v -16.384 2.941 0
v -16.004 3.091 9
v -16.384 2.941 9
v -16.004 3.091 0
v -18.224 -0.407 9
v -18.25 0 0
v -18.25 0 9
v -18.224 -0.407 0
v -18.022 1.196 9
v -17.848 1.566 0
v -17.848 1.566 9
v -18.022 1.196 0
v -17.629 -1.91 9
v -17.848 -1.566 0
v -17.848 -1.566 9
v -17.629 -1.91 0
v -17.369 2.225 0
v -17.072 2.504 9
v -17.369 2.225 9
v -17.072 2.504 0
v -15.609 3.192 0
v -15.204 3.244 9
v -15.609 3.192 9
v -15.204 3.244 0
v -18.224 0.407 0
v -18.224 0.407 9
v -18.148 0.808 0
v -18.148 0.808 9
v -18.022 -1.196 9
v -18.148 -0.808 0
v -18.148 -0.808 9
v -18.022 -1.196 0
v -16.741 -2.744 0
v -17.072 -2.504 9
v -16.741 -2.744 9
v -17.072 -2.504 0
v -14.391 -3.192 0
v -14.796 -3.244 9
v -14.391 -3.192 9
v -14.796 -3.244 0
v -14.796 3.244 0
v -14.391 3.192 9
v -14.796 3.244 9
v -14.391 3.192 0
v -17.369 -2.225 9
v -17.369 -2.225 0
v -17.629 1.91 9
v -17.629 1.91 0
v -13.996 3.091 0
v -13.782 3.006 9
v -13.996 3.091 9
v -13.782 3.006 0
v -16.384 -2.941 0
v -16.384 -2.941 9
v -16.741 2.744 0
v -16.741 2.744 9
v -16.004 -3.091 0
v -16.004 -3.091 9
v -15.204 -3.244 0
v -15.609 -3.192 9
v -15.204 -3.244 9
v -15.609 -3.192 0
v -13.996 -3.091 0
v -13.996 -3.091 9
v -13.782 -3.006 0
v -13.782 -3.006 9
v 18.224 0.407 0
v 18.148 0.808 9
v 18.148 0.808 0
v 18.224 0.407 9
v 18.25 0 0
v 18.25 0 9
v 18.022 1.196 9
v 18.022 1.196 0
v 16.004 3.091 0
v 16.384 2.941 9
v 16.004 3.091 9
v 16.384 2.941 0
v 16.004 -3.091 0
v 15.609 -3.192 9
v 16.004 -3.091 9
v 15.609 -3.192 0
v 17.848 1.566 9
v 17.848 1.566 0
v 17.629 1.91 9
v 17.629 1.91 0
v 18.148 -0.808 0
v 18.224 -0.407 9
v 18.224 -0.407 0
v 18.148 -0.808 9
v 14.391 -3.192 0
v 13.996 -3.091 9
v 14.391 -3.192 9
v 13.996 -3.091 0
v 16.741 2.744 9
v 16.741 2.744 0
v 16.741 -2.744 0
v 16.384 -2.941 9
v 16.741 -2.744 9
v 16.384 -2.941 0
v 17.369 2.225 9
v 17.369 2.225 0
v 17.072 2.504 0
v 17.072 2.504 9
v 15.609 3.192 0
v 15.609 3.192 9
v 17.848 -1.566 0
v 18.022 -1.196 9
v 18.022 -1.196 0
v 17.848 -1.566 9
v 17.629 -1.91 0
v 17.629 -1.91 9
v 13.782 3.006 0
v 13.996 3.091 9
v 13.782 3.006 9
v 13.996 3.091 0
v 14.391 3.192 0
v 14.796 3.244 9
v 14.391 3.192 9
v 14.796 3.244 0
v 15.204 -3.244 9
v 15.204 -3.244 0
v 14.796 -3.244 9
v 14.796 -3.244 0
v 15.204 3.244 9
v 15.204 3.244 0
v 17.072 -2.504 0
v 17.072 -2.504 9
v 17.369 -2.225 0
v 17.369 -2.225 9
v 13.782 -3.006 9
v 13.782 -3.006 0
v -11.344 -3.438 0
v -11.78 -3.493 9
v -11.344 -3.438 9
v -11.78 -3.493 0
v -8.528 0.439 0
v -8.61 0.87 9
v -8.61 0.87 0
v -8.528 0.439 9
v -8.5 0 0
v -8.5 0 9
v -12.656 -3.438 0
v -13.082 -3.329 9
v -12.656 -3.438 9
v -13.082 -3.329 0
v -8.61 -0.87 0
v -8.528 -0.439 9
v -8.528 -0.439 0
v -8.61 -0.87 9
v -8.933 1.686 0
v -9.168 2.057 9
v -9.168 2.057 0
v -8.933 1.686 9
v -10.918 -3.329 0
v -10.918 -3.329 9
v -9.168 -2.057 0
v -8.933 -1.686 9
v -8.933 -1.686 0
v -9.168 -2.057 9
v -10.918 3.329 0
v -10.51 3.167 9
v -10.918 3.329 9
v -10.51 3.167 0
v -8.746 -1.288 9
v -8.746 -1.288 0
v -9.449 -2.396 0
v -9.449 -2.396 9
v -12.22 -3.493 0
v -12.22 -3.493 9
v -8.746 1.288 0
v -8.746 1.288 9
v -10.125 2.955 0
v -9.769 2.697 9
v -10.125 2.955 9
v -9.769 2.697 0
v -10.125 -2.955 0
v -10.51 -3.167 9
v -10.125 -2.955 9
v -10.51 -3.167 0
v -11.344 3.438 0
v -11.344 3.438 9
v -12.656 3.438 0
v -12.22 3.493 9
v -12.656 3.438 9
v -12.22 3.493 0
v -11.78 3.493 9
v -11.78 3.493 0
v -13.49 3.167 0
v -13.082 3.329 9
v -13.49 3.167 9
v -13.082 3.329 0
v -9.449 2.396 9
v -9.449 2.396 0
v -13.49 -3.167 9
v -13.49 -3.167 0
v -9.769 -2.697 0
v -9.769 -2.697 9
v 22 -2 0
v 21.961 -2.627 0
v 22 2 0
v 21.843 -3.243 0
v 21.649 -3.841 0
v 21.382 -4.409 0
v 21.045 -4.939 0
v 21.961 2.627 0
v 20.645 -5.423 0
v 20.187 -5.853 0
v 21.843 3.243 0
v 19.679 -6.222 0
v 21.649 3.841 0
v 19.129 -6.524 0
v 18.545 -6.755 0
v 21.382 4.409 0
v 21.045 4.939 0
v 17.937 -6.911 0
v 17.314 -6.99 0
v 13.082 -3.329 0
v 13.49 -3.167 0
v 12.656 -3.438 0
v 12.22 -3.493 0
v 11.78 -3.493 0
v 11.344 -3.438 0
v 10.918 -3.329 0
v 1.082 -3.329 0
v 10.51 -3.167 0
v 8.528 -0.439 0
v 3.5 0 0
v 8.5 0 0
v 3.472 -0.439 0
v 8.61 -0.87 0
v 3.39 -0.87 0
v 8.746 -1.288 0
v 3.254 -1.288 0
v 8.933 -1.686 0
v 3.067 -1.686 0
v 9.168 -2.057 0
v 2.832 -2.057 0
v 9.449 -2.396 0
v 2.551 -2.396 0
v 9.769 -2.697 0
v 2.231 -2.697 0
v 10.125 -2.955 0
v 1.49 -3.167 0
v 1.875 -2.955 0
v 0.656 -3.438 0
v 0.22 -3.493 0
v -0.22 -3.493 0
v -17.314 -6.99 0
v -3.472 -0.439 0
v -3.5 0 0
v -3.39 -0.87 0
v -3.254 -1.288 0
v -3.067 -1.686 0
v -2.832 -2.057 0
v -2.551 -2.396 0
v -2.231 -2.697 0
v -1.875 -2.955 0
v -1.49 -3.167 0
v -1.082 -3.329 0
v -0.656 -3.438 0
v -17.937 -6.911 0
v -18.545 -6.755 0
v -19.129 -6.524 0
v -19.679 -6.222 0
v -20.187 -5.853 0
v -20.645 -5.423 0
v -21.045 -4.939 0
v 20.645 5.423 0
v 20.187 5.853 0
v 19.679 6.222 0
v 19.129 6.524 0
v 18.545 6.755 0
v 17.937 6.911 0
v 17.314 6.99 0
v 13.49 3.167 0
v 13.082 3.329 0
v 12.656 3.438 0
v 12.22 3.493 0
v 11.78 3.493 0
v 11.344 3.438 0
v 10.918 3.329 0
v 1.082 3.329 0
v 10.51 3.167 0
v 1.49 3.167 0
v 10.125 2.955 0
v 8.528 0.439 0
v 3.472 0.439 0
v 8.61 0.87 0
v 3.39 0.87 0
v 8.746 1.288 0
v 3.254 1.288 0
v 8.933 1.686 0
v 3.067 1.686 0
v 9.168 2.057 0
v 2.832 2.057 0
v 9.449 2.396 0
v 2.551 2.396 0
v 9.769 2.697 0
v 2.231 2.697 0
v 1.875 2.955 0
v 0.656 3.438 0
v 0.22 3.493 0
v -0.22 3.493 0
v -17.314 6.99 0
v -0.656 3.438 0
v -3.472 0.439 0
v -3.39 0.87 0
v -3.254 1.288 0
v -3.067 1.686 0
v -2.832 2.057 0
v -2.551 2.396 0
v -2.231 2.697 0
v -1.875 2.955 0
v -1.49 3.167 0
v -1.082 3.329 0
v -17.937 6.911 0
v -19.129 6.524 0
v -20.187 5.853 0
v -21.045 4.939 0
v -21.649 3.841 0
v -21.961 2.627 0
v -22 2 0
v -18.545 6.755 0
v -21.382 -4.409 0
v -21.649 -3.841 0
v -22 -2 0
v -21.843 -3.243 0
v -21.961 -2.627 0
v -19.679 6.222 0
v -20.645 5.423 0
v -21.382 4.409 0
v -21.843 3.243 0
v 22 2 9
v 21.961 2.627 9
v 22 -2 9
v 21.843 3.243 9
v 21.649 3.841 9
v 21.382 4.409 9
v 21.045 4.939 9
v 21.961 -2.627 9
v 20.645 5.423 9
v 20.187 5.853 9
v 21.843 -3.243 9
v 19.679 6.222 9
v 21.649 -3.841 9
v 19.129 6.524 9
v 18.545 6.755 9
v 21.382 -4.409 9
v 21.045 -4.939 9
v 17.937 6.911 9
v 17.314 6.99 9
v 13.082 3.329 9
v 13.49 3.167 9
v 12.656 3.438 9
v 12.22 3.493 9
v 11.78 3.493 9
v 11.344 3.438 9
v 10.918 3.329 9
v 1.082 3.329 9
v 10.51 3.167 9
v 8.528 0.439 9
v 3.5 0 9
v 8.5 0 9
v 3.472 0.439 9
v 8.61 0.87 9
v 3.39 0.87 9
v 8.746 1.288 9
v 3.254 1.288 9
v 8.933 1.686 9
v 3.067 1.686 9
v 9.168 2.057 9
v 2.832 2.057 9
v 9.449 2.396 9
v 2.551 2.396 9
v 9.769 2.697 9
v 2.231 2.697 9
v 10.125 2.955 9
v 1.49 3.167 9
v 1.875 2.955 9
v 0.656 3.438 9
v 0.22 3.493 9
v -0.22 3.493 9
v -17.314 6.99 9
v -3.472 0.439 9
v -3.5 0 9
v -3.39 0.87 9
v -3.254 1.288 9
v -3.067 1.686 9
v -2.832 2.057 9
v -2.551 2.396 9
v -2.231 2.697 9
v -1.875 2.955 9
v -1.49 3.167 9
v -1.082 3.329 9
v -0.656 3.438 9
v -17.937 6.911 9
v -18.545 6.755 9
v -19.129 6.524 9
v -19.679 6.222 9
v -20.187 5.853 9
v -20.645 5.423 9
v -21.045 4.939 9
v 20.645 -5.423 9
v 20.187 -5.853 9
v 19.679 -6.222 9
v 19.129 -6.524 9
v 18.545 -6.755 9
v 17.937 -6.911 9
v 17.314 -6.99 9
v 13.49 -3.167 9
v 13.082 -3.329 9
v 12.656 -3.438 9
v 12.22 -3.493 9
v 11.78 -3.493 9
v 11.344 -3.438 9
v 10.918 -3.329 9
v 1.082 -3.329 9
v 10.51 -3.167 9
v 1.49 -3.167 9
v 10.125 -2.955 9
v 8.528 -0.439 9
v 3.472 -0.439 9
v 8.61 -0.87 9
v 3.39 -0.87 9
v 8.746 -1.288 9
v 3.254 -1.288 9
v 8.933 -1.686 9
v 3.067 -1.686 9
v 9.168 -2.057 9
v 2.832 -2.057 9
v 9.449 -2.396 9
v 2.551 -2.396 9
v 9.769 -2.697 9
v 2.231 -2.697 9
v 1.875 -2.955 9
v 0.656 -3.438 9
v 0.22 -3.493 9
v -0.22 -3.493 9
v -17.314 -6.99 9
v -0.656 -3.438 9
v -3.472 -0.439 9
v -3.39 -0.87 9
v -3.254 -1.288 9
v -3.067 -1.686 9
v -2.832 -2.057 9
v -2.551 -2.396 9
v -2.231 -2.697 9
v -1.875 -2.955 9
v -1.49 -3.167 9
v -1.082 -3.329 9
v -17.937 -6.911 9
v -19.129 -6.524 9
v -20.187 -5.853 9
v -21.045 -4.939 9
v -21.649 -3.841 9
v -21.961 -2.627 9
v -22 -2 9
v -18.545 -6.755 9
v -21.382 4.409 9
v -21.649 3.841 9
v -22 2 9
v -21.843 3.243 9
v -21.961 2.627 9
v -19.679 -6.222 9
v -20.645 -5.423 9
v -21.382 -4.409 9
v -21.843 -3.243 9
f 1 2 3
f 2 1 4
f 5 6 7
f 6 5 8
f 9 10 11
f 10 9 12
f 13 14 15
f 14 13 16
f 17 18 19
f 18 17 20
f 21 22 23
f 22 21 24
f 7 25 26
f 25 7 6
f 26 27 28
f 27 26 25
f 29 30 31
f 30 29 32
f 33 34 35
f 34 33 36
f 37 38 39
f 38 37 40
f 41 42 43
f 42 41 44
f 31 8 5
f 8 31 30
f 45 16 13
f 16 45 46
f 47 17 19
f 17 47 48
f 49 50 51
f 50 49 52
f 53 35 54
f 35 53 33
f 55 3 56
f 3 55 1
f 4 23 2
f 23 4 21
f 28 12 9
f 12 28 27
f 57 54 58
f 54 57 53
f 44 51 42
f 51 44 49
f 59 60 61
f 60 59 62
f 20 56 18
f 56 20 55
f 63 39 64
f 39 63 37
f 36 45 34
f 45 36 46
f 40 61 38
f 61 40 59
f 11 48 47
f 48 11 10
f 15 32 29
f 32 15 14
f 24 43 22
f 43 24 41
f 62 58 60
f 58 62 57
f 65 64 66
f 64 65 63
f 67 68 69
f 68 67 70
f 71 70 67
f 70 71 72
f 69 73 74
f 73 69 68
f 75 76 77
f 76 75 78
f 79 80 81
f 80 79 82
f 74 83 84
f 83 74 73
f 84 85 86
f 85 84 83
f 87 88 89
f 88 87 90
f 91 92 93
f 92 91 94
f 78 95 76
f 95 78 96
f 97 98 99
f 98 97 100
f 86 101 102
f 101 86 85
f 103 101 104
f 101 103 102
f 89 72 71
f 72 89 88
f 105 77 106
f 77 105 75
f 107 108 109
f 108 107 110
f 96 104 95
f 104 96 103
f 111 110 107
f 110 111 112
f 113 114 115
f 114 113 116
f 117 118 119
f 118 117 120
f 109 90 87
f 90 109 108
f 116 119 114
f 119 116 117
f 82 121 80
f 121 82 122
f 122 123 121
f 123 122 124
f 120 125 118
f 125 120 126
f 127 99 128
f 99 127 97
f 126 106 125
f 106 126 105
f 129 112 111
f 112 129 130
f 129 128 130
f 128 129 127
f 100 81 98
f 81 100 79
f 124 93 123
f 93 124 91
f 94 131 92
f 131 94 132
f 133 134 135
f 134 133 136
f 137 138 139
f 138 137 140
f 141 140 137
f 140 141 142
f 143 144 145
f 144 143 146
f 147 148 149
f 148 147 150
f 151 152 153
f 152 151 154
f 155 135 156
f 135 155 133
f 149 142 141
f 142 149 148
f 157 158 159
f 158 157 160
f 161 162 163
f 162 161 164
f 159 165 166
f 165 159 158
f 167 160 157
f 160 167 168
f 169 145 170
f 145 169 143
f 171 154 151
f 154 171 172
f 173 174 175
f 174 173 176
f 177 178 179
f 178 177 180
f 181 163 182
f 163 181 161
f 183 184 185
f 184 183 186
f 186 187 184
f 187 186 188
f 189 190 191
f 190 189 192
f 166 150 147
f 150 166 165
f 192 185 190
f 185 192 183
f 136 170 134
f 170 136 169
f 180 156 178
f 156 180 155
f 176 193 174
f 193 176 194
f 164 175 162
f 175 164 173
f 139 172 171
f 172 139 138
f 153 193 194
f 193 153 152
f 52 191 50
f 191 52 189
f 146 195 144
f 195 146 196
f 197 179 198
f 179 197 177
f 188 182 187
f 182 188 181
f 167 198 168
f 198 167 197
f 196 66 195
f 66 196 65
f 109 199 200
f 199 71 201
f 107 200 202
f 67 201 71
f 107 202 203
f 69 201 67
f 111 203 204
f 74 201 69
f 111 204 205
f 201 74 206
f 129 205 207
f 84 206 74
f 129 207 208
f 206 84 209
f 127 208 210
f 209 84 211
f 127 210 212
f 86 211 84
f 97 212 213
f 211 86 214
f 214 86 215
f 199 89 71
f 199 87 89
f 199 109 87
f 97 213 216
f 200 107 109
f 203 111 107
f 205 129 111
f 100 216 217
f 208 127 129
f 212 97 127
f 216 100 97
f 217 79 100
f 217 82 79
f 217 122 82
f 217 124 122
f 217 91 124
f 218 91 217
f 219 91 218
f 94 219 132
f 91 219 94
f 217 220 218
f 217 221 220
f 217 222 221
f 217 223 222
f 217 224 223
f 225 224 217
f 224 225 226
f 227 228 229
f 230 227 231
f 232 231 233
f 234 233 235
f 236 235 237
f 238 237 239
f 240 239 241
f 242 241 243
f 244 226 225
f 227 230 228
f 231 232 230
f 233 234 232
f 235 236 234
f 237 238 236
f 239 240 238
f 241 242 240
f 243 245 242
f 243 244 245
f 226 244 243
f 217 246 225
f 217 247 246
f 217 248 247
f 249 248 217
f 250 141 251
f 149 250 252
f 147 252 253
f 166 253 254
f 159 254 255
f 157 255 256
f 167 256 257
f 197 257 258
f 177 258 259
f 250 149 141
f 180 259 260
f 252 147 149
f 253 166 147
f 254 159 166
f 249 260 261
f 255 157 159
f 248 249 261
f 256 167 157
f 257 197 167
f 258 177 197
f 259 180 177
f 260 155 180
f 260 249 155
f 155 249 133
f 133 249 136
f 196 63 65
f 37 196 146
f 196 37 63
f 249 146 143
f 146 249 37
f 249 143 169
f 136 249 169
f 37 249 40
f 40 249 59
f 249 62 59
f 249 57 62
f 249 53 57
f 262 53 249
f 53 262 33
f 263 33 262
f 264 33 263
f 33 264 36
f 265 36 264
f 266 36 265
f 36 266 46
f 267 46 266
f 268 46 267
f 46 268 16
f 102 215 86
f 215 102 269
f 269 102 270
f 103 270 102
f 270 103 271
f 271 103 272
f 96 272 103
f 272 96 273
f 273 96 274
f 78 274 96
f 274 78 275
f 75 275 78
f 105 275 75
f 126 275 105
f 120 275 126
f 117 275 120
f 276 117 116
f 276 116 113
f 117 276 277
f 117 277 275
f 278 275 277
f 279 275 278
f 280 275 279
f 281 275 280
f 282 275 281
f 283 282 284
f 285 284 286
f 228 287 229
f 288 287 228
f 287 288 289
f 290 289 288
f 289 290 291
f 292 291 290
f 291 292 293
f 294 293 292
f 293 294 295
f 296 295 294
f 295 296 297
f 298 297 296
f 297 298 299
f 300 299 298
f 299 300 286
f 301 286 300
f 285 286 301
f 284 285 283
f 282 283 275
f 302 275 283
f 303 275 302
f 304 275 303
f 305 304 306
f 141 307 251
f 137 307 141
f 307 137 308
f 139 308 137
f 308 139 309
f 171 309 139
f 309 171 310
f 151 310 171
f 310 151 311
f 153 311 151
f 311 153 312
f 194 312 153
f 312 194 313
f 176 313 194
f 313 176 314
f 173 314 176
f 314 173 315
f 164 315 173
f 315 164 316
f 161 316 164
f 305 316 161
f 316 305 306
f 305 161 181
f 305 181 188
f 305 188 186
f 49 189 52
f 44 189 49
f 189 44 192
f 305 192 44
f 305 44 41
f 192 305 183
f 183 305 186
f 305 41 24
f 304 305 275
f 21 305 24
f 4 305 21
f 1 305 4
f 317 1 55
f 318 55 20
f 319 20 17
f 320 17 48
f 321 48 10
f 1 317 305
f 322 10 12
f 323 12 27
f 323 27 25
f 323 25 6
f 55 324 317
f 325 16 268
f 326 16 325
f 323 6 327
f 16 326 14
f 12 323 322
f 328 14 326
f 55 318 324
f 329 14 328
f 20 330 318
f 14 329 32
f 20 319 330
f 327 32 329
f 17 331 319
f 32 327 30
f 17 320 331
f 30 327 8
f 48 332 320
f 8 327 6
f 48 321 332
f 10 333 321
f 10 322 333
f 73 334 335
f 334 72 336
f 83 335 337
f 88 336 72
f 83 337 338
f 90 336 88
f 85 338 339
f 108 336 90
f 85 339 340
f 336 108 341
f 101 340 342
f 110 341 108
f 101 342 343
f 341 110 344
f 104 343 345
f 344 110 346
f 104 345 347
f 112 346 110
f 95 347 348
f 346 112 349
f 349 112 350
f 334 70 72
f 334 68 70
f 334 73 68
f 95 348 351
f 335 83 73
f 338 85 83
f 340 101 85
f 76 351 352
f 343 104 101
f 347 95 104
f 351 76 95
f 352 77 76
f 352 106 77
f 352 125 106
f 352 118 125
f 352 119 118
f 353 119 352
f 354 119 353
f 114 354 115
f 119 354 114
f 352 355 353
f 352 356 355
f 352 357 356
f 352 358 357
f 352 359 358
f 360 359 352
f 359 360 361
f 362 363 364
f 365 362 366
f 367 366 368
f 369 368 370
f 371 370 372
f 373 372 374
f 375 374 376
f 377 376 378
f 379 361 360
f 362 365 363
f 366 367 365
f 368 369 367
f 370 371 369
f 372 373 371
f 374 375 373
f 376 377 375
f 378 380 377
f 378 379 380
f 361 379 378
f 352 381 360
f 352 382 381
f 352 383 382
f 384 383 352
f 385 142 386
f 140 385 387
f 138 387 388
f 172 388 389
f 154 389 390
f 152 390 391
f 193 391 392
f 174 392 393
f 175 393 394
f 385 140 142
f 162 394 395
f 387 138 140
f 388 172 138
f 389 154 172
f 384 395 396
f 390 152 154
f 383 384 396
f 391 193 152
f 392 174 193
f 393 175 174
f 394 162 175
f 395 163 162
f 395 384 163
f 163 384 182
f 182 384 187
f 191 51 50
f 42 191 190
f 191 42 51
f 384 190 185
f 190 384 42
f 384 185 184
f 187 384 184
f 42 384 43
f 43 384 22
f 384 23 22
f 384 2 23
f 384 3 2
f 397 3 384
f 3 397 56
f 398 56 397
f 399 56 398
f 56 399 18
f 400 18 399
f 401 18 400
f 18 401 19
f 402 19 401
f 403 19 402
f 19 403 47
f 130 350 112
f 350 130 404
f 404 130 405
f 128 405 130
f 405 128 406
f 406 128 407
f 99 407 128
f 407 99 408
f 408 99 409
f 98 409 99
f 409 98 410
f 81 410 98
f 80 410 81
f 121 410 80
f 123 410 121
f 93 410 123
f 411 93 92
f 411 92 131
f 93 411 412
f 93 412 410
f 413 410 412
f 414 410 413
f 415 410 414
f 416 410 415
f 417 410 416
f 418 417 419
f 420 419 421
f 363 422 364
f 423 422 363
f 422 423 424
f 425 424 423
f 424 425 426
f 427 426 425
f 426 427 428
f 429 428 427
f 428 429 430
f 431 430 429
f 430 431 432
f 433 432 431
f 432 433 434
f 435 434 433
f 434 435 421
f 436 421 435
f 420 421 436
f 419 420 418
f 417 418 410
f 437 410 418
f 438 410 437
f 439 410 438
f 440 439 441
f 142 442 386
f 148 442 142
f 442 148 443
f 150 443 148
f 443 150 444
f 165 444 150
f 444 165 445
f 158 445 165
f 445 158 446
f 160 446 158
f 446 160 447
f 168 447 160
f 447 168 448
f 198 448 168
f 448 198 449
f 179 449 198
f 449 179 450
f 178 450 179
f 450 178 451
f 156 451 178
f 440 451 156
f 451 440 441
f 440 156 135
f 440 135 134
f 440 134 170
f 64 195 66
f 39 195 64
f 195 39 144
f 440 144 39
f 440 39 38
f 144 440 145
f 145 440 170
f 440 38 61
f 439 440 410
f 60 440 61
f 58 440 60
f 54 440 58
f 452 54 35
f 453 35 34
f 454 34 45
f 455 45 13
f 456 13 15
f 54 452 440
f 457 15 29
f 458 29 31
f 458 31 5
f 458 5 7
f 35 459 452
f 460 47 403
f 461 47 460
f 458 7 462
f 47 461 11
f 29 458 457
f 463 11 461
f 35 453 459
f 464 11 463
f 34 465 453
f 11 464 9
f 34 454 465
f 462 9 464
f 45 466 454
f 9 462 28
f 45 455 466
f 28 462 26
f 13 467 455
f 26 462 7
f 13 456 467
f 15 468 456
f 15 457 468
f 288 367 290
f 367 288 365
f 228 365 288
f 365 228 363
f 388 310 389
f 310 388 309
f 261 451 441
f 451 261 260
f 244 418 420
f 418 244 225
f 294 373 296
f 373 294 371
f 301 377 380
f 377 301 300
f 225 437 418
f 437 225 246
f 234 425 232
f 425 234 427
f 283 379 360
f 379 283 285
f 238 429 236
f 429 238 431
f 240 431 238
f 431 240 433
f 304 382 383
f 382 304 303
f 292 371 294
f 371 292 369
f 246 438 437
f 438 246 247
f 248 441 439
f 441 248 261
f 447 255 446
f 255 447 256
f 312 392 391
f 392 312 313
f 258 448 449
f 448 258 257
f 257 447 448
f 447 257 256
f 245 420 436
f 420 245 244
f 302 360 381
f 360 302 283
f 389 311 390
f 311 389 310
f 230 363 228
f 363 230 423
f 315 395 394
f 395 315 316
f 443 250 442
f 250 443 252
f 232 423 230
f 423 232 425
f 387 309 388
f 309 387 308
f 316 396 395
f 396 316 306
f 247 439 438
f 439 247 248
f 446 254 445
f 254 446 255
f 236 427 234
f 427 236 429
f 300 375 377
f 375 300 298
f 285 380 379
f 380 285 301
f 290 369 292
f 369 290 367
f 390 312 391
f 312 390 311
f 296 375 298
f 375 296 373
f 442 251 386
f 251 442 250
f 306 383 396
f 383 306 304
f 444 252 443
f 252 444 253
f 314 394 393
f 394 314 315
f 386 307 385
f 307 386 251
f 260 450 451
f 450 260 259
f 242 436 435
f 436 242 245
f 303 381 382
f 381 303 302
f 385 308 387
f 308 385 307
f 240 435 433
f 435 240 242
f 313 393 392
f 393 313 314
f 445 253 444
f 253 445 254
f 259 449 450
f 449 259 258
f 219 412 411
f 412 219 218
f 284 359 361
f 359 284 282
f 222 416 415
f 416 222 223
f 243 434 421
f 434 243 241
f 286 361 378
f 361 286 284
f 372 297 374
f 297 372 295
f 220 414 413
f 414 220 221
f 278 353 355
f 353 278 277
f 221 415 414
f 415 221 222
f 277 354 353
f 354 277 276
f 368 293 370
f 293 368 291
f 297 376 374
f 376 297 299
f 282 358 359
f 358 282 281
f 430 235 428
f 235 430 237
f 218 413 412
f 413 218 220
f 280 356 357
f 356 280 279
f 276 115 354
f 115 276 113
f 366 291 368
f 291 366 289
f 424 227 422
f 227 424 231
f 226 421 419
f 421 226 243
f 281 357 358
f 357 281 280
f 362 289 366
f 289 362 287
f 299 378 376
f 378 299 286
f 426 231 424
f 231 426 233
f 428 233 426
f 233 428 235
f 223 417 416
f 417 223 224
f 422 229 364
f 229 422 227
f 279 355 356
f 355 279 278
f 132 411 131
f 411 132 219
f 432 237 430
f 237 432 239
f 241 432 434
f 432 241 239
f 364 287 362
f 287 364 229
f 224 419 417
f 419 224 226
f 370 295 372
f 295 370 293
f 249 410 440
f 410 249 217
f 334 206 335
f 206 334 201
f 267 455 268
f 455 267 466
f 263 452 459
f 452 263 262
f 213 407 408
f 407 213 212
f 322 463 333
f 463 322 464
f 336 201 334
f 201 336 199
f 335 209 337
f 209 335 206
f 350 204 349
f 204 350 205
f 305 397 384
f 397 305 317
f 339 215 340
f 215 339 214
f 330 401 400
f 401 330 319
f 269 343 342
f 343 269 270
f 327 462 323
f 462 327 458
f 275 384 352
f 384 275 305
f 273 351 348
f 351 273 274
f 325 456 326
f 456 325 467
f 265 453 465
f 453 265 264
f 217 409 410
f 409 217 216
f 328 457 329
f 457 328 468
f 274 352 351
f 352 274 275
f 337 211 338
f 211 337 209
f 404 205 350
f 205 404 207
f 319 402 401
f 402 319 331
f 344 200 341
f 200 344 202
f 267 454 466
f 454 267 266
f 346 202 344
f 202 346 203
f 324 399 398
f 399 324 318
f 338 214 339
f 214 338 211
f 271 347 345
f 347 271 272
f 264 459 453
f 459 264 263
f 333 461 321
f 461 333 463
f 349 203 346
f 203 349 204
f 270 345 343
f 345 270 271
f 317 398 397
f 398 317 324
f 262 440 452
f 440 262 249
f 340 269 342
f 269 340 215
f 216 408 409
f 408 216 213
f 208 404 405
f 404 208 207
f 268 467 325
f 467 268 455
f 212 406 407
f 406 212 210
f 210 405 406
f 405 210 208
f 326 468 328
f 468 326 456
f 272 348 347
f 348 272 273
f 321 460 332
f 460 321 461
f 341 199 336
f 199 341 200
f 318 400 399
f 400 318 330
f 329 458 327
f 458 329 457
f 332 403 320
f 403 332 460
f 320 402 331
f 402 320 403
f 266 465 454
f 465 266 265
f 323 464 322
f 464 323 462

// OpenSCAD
$fn = 50;

difference() {
	union() {
		hull() {
			translate(v = [-17.0, 2.0, 0]) {
				cylinder(h = 9, r = 5);
			}
			translate(v = [17.0, 2.0, 0]) {
				cylinder(h = 9, r = 5);
			}
			translate(v = [-17.0, -2.0, 0]) {
				cylinder(h = 9, r = 5);
			}
			translate(v = [17.0, -2.0, 0]) {
				cylinder(h = 9, r = 5);
			}
		}
	}
	union() {
		translate(v = [-15.0, 0.0, -100.0]) {
			cylinder(h = 200, r = 3.25);
		}
		translate(v = [15.0, 0.0, -100.0]) {
			cylinder(h = 200, r = 3.25);
		}
		translate(v = [-15.0, 0.0, -100.0]) {
			cylinder(h = 200, r = 1.8);
		}
		translate(v = [15.0, 0.0, -100.0]) {
			cylinder(h = 200, r = 1.8);
		}
		translate(v = [-12.0, 0, 0.0]) {
			cylinder(h = 9, r = 3.5);
		}
		cylinder(h = 9, r = 3.5);
		translate(v = [12.0, 0, 0.0]) {
			cylinder(h = 9, r = 3.5);
		}
	}
}
